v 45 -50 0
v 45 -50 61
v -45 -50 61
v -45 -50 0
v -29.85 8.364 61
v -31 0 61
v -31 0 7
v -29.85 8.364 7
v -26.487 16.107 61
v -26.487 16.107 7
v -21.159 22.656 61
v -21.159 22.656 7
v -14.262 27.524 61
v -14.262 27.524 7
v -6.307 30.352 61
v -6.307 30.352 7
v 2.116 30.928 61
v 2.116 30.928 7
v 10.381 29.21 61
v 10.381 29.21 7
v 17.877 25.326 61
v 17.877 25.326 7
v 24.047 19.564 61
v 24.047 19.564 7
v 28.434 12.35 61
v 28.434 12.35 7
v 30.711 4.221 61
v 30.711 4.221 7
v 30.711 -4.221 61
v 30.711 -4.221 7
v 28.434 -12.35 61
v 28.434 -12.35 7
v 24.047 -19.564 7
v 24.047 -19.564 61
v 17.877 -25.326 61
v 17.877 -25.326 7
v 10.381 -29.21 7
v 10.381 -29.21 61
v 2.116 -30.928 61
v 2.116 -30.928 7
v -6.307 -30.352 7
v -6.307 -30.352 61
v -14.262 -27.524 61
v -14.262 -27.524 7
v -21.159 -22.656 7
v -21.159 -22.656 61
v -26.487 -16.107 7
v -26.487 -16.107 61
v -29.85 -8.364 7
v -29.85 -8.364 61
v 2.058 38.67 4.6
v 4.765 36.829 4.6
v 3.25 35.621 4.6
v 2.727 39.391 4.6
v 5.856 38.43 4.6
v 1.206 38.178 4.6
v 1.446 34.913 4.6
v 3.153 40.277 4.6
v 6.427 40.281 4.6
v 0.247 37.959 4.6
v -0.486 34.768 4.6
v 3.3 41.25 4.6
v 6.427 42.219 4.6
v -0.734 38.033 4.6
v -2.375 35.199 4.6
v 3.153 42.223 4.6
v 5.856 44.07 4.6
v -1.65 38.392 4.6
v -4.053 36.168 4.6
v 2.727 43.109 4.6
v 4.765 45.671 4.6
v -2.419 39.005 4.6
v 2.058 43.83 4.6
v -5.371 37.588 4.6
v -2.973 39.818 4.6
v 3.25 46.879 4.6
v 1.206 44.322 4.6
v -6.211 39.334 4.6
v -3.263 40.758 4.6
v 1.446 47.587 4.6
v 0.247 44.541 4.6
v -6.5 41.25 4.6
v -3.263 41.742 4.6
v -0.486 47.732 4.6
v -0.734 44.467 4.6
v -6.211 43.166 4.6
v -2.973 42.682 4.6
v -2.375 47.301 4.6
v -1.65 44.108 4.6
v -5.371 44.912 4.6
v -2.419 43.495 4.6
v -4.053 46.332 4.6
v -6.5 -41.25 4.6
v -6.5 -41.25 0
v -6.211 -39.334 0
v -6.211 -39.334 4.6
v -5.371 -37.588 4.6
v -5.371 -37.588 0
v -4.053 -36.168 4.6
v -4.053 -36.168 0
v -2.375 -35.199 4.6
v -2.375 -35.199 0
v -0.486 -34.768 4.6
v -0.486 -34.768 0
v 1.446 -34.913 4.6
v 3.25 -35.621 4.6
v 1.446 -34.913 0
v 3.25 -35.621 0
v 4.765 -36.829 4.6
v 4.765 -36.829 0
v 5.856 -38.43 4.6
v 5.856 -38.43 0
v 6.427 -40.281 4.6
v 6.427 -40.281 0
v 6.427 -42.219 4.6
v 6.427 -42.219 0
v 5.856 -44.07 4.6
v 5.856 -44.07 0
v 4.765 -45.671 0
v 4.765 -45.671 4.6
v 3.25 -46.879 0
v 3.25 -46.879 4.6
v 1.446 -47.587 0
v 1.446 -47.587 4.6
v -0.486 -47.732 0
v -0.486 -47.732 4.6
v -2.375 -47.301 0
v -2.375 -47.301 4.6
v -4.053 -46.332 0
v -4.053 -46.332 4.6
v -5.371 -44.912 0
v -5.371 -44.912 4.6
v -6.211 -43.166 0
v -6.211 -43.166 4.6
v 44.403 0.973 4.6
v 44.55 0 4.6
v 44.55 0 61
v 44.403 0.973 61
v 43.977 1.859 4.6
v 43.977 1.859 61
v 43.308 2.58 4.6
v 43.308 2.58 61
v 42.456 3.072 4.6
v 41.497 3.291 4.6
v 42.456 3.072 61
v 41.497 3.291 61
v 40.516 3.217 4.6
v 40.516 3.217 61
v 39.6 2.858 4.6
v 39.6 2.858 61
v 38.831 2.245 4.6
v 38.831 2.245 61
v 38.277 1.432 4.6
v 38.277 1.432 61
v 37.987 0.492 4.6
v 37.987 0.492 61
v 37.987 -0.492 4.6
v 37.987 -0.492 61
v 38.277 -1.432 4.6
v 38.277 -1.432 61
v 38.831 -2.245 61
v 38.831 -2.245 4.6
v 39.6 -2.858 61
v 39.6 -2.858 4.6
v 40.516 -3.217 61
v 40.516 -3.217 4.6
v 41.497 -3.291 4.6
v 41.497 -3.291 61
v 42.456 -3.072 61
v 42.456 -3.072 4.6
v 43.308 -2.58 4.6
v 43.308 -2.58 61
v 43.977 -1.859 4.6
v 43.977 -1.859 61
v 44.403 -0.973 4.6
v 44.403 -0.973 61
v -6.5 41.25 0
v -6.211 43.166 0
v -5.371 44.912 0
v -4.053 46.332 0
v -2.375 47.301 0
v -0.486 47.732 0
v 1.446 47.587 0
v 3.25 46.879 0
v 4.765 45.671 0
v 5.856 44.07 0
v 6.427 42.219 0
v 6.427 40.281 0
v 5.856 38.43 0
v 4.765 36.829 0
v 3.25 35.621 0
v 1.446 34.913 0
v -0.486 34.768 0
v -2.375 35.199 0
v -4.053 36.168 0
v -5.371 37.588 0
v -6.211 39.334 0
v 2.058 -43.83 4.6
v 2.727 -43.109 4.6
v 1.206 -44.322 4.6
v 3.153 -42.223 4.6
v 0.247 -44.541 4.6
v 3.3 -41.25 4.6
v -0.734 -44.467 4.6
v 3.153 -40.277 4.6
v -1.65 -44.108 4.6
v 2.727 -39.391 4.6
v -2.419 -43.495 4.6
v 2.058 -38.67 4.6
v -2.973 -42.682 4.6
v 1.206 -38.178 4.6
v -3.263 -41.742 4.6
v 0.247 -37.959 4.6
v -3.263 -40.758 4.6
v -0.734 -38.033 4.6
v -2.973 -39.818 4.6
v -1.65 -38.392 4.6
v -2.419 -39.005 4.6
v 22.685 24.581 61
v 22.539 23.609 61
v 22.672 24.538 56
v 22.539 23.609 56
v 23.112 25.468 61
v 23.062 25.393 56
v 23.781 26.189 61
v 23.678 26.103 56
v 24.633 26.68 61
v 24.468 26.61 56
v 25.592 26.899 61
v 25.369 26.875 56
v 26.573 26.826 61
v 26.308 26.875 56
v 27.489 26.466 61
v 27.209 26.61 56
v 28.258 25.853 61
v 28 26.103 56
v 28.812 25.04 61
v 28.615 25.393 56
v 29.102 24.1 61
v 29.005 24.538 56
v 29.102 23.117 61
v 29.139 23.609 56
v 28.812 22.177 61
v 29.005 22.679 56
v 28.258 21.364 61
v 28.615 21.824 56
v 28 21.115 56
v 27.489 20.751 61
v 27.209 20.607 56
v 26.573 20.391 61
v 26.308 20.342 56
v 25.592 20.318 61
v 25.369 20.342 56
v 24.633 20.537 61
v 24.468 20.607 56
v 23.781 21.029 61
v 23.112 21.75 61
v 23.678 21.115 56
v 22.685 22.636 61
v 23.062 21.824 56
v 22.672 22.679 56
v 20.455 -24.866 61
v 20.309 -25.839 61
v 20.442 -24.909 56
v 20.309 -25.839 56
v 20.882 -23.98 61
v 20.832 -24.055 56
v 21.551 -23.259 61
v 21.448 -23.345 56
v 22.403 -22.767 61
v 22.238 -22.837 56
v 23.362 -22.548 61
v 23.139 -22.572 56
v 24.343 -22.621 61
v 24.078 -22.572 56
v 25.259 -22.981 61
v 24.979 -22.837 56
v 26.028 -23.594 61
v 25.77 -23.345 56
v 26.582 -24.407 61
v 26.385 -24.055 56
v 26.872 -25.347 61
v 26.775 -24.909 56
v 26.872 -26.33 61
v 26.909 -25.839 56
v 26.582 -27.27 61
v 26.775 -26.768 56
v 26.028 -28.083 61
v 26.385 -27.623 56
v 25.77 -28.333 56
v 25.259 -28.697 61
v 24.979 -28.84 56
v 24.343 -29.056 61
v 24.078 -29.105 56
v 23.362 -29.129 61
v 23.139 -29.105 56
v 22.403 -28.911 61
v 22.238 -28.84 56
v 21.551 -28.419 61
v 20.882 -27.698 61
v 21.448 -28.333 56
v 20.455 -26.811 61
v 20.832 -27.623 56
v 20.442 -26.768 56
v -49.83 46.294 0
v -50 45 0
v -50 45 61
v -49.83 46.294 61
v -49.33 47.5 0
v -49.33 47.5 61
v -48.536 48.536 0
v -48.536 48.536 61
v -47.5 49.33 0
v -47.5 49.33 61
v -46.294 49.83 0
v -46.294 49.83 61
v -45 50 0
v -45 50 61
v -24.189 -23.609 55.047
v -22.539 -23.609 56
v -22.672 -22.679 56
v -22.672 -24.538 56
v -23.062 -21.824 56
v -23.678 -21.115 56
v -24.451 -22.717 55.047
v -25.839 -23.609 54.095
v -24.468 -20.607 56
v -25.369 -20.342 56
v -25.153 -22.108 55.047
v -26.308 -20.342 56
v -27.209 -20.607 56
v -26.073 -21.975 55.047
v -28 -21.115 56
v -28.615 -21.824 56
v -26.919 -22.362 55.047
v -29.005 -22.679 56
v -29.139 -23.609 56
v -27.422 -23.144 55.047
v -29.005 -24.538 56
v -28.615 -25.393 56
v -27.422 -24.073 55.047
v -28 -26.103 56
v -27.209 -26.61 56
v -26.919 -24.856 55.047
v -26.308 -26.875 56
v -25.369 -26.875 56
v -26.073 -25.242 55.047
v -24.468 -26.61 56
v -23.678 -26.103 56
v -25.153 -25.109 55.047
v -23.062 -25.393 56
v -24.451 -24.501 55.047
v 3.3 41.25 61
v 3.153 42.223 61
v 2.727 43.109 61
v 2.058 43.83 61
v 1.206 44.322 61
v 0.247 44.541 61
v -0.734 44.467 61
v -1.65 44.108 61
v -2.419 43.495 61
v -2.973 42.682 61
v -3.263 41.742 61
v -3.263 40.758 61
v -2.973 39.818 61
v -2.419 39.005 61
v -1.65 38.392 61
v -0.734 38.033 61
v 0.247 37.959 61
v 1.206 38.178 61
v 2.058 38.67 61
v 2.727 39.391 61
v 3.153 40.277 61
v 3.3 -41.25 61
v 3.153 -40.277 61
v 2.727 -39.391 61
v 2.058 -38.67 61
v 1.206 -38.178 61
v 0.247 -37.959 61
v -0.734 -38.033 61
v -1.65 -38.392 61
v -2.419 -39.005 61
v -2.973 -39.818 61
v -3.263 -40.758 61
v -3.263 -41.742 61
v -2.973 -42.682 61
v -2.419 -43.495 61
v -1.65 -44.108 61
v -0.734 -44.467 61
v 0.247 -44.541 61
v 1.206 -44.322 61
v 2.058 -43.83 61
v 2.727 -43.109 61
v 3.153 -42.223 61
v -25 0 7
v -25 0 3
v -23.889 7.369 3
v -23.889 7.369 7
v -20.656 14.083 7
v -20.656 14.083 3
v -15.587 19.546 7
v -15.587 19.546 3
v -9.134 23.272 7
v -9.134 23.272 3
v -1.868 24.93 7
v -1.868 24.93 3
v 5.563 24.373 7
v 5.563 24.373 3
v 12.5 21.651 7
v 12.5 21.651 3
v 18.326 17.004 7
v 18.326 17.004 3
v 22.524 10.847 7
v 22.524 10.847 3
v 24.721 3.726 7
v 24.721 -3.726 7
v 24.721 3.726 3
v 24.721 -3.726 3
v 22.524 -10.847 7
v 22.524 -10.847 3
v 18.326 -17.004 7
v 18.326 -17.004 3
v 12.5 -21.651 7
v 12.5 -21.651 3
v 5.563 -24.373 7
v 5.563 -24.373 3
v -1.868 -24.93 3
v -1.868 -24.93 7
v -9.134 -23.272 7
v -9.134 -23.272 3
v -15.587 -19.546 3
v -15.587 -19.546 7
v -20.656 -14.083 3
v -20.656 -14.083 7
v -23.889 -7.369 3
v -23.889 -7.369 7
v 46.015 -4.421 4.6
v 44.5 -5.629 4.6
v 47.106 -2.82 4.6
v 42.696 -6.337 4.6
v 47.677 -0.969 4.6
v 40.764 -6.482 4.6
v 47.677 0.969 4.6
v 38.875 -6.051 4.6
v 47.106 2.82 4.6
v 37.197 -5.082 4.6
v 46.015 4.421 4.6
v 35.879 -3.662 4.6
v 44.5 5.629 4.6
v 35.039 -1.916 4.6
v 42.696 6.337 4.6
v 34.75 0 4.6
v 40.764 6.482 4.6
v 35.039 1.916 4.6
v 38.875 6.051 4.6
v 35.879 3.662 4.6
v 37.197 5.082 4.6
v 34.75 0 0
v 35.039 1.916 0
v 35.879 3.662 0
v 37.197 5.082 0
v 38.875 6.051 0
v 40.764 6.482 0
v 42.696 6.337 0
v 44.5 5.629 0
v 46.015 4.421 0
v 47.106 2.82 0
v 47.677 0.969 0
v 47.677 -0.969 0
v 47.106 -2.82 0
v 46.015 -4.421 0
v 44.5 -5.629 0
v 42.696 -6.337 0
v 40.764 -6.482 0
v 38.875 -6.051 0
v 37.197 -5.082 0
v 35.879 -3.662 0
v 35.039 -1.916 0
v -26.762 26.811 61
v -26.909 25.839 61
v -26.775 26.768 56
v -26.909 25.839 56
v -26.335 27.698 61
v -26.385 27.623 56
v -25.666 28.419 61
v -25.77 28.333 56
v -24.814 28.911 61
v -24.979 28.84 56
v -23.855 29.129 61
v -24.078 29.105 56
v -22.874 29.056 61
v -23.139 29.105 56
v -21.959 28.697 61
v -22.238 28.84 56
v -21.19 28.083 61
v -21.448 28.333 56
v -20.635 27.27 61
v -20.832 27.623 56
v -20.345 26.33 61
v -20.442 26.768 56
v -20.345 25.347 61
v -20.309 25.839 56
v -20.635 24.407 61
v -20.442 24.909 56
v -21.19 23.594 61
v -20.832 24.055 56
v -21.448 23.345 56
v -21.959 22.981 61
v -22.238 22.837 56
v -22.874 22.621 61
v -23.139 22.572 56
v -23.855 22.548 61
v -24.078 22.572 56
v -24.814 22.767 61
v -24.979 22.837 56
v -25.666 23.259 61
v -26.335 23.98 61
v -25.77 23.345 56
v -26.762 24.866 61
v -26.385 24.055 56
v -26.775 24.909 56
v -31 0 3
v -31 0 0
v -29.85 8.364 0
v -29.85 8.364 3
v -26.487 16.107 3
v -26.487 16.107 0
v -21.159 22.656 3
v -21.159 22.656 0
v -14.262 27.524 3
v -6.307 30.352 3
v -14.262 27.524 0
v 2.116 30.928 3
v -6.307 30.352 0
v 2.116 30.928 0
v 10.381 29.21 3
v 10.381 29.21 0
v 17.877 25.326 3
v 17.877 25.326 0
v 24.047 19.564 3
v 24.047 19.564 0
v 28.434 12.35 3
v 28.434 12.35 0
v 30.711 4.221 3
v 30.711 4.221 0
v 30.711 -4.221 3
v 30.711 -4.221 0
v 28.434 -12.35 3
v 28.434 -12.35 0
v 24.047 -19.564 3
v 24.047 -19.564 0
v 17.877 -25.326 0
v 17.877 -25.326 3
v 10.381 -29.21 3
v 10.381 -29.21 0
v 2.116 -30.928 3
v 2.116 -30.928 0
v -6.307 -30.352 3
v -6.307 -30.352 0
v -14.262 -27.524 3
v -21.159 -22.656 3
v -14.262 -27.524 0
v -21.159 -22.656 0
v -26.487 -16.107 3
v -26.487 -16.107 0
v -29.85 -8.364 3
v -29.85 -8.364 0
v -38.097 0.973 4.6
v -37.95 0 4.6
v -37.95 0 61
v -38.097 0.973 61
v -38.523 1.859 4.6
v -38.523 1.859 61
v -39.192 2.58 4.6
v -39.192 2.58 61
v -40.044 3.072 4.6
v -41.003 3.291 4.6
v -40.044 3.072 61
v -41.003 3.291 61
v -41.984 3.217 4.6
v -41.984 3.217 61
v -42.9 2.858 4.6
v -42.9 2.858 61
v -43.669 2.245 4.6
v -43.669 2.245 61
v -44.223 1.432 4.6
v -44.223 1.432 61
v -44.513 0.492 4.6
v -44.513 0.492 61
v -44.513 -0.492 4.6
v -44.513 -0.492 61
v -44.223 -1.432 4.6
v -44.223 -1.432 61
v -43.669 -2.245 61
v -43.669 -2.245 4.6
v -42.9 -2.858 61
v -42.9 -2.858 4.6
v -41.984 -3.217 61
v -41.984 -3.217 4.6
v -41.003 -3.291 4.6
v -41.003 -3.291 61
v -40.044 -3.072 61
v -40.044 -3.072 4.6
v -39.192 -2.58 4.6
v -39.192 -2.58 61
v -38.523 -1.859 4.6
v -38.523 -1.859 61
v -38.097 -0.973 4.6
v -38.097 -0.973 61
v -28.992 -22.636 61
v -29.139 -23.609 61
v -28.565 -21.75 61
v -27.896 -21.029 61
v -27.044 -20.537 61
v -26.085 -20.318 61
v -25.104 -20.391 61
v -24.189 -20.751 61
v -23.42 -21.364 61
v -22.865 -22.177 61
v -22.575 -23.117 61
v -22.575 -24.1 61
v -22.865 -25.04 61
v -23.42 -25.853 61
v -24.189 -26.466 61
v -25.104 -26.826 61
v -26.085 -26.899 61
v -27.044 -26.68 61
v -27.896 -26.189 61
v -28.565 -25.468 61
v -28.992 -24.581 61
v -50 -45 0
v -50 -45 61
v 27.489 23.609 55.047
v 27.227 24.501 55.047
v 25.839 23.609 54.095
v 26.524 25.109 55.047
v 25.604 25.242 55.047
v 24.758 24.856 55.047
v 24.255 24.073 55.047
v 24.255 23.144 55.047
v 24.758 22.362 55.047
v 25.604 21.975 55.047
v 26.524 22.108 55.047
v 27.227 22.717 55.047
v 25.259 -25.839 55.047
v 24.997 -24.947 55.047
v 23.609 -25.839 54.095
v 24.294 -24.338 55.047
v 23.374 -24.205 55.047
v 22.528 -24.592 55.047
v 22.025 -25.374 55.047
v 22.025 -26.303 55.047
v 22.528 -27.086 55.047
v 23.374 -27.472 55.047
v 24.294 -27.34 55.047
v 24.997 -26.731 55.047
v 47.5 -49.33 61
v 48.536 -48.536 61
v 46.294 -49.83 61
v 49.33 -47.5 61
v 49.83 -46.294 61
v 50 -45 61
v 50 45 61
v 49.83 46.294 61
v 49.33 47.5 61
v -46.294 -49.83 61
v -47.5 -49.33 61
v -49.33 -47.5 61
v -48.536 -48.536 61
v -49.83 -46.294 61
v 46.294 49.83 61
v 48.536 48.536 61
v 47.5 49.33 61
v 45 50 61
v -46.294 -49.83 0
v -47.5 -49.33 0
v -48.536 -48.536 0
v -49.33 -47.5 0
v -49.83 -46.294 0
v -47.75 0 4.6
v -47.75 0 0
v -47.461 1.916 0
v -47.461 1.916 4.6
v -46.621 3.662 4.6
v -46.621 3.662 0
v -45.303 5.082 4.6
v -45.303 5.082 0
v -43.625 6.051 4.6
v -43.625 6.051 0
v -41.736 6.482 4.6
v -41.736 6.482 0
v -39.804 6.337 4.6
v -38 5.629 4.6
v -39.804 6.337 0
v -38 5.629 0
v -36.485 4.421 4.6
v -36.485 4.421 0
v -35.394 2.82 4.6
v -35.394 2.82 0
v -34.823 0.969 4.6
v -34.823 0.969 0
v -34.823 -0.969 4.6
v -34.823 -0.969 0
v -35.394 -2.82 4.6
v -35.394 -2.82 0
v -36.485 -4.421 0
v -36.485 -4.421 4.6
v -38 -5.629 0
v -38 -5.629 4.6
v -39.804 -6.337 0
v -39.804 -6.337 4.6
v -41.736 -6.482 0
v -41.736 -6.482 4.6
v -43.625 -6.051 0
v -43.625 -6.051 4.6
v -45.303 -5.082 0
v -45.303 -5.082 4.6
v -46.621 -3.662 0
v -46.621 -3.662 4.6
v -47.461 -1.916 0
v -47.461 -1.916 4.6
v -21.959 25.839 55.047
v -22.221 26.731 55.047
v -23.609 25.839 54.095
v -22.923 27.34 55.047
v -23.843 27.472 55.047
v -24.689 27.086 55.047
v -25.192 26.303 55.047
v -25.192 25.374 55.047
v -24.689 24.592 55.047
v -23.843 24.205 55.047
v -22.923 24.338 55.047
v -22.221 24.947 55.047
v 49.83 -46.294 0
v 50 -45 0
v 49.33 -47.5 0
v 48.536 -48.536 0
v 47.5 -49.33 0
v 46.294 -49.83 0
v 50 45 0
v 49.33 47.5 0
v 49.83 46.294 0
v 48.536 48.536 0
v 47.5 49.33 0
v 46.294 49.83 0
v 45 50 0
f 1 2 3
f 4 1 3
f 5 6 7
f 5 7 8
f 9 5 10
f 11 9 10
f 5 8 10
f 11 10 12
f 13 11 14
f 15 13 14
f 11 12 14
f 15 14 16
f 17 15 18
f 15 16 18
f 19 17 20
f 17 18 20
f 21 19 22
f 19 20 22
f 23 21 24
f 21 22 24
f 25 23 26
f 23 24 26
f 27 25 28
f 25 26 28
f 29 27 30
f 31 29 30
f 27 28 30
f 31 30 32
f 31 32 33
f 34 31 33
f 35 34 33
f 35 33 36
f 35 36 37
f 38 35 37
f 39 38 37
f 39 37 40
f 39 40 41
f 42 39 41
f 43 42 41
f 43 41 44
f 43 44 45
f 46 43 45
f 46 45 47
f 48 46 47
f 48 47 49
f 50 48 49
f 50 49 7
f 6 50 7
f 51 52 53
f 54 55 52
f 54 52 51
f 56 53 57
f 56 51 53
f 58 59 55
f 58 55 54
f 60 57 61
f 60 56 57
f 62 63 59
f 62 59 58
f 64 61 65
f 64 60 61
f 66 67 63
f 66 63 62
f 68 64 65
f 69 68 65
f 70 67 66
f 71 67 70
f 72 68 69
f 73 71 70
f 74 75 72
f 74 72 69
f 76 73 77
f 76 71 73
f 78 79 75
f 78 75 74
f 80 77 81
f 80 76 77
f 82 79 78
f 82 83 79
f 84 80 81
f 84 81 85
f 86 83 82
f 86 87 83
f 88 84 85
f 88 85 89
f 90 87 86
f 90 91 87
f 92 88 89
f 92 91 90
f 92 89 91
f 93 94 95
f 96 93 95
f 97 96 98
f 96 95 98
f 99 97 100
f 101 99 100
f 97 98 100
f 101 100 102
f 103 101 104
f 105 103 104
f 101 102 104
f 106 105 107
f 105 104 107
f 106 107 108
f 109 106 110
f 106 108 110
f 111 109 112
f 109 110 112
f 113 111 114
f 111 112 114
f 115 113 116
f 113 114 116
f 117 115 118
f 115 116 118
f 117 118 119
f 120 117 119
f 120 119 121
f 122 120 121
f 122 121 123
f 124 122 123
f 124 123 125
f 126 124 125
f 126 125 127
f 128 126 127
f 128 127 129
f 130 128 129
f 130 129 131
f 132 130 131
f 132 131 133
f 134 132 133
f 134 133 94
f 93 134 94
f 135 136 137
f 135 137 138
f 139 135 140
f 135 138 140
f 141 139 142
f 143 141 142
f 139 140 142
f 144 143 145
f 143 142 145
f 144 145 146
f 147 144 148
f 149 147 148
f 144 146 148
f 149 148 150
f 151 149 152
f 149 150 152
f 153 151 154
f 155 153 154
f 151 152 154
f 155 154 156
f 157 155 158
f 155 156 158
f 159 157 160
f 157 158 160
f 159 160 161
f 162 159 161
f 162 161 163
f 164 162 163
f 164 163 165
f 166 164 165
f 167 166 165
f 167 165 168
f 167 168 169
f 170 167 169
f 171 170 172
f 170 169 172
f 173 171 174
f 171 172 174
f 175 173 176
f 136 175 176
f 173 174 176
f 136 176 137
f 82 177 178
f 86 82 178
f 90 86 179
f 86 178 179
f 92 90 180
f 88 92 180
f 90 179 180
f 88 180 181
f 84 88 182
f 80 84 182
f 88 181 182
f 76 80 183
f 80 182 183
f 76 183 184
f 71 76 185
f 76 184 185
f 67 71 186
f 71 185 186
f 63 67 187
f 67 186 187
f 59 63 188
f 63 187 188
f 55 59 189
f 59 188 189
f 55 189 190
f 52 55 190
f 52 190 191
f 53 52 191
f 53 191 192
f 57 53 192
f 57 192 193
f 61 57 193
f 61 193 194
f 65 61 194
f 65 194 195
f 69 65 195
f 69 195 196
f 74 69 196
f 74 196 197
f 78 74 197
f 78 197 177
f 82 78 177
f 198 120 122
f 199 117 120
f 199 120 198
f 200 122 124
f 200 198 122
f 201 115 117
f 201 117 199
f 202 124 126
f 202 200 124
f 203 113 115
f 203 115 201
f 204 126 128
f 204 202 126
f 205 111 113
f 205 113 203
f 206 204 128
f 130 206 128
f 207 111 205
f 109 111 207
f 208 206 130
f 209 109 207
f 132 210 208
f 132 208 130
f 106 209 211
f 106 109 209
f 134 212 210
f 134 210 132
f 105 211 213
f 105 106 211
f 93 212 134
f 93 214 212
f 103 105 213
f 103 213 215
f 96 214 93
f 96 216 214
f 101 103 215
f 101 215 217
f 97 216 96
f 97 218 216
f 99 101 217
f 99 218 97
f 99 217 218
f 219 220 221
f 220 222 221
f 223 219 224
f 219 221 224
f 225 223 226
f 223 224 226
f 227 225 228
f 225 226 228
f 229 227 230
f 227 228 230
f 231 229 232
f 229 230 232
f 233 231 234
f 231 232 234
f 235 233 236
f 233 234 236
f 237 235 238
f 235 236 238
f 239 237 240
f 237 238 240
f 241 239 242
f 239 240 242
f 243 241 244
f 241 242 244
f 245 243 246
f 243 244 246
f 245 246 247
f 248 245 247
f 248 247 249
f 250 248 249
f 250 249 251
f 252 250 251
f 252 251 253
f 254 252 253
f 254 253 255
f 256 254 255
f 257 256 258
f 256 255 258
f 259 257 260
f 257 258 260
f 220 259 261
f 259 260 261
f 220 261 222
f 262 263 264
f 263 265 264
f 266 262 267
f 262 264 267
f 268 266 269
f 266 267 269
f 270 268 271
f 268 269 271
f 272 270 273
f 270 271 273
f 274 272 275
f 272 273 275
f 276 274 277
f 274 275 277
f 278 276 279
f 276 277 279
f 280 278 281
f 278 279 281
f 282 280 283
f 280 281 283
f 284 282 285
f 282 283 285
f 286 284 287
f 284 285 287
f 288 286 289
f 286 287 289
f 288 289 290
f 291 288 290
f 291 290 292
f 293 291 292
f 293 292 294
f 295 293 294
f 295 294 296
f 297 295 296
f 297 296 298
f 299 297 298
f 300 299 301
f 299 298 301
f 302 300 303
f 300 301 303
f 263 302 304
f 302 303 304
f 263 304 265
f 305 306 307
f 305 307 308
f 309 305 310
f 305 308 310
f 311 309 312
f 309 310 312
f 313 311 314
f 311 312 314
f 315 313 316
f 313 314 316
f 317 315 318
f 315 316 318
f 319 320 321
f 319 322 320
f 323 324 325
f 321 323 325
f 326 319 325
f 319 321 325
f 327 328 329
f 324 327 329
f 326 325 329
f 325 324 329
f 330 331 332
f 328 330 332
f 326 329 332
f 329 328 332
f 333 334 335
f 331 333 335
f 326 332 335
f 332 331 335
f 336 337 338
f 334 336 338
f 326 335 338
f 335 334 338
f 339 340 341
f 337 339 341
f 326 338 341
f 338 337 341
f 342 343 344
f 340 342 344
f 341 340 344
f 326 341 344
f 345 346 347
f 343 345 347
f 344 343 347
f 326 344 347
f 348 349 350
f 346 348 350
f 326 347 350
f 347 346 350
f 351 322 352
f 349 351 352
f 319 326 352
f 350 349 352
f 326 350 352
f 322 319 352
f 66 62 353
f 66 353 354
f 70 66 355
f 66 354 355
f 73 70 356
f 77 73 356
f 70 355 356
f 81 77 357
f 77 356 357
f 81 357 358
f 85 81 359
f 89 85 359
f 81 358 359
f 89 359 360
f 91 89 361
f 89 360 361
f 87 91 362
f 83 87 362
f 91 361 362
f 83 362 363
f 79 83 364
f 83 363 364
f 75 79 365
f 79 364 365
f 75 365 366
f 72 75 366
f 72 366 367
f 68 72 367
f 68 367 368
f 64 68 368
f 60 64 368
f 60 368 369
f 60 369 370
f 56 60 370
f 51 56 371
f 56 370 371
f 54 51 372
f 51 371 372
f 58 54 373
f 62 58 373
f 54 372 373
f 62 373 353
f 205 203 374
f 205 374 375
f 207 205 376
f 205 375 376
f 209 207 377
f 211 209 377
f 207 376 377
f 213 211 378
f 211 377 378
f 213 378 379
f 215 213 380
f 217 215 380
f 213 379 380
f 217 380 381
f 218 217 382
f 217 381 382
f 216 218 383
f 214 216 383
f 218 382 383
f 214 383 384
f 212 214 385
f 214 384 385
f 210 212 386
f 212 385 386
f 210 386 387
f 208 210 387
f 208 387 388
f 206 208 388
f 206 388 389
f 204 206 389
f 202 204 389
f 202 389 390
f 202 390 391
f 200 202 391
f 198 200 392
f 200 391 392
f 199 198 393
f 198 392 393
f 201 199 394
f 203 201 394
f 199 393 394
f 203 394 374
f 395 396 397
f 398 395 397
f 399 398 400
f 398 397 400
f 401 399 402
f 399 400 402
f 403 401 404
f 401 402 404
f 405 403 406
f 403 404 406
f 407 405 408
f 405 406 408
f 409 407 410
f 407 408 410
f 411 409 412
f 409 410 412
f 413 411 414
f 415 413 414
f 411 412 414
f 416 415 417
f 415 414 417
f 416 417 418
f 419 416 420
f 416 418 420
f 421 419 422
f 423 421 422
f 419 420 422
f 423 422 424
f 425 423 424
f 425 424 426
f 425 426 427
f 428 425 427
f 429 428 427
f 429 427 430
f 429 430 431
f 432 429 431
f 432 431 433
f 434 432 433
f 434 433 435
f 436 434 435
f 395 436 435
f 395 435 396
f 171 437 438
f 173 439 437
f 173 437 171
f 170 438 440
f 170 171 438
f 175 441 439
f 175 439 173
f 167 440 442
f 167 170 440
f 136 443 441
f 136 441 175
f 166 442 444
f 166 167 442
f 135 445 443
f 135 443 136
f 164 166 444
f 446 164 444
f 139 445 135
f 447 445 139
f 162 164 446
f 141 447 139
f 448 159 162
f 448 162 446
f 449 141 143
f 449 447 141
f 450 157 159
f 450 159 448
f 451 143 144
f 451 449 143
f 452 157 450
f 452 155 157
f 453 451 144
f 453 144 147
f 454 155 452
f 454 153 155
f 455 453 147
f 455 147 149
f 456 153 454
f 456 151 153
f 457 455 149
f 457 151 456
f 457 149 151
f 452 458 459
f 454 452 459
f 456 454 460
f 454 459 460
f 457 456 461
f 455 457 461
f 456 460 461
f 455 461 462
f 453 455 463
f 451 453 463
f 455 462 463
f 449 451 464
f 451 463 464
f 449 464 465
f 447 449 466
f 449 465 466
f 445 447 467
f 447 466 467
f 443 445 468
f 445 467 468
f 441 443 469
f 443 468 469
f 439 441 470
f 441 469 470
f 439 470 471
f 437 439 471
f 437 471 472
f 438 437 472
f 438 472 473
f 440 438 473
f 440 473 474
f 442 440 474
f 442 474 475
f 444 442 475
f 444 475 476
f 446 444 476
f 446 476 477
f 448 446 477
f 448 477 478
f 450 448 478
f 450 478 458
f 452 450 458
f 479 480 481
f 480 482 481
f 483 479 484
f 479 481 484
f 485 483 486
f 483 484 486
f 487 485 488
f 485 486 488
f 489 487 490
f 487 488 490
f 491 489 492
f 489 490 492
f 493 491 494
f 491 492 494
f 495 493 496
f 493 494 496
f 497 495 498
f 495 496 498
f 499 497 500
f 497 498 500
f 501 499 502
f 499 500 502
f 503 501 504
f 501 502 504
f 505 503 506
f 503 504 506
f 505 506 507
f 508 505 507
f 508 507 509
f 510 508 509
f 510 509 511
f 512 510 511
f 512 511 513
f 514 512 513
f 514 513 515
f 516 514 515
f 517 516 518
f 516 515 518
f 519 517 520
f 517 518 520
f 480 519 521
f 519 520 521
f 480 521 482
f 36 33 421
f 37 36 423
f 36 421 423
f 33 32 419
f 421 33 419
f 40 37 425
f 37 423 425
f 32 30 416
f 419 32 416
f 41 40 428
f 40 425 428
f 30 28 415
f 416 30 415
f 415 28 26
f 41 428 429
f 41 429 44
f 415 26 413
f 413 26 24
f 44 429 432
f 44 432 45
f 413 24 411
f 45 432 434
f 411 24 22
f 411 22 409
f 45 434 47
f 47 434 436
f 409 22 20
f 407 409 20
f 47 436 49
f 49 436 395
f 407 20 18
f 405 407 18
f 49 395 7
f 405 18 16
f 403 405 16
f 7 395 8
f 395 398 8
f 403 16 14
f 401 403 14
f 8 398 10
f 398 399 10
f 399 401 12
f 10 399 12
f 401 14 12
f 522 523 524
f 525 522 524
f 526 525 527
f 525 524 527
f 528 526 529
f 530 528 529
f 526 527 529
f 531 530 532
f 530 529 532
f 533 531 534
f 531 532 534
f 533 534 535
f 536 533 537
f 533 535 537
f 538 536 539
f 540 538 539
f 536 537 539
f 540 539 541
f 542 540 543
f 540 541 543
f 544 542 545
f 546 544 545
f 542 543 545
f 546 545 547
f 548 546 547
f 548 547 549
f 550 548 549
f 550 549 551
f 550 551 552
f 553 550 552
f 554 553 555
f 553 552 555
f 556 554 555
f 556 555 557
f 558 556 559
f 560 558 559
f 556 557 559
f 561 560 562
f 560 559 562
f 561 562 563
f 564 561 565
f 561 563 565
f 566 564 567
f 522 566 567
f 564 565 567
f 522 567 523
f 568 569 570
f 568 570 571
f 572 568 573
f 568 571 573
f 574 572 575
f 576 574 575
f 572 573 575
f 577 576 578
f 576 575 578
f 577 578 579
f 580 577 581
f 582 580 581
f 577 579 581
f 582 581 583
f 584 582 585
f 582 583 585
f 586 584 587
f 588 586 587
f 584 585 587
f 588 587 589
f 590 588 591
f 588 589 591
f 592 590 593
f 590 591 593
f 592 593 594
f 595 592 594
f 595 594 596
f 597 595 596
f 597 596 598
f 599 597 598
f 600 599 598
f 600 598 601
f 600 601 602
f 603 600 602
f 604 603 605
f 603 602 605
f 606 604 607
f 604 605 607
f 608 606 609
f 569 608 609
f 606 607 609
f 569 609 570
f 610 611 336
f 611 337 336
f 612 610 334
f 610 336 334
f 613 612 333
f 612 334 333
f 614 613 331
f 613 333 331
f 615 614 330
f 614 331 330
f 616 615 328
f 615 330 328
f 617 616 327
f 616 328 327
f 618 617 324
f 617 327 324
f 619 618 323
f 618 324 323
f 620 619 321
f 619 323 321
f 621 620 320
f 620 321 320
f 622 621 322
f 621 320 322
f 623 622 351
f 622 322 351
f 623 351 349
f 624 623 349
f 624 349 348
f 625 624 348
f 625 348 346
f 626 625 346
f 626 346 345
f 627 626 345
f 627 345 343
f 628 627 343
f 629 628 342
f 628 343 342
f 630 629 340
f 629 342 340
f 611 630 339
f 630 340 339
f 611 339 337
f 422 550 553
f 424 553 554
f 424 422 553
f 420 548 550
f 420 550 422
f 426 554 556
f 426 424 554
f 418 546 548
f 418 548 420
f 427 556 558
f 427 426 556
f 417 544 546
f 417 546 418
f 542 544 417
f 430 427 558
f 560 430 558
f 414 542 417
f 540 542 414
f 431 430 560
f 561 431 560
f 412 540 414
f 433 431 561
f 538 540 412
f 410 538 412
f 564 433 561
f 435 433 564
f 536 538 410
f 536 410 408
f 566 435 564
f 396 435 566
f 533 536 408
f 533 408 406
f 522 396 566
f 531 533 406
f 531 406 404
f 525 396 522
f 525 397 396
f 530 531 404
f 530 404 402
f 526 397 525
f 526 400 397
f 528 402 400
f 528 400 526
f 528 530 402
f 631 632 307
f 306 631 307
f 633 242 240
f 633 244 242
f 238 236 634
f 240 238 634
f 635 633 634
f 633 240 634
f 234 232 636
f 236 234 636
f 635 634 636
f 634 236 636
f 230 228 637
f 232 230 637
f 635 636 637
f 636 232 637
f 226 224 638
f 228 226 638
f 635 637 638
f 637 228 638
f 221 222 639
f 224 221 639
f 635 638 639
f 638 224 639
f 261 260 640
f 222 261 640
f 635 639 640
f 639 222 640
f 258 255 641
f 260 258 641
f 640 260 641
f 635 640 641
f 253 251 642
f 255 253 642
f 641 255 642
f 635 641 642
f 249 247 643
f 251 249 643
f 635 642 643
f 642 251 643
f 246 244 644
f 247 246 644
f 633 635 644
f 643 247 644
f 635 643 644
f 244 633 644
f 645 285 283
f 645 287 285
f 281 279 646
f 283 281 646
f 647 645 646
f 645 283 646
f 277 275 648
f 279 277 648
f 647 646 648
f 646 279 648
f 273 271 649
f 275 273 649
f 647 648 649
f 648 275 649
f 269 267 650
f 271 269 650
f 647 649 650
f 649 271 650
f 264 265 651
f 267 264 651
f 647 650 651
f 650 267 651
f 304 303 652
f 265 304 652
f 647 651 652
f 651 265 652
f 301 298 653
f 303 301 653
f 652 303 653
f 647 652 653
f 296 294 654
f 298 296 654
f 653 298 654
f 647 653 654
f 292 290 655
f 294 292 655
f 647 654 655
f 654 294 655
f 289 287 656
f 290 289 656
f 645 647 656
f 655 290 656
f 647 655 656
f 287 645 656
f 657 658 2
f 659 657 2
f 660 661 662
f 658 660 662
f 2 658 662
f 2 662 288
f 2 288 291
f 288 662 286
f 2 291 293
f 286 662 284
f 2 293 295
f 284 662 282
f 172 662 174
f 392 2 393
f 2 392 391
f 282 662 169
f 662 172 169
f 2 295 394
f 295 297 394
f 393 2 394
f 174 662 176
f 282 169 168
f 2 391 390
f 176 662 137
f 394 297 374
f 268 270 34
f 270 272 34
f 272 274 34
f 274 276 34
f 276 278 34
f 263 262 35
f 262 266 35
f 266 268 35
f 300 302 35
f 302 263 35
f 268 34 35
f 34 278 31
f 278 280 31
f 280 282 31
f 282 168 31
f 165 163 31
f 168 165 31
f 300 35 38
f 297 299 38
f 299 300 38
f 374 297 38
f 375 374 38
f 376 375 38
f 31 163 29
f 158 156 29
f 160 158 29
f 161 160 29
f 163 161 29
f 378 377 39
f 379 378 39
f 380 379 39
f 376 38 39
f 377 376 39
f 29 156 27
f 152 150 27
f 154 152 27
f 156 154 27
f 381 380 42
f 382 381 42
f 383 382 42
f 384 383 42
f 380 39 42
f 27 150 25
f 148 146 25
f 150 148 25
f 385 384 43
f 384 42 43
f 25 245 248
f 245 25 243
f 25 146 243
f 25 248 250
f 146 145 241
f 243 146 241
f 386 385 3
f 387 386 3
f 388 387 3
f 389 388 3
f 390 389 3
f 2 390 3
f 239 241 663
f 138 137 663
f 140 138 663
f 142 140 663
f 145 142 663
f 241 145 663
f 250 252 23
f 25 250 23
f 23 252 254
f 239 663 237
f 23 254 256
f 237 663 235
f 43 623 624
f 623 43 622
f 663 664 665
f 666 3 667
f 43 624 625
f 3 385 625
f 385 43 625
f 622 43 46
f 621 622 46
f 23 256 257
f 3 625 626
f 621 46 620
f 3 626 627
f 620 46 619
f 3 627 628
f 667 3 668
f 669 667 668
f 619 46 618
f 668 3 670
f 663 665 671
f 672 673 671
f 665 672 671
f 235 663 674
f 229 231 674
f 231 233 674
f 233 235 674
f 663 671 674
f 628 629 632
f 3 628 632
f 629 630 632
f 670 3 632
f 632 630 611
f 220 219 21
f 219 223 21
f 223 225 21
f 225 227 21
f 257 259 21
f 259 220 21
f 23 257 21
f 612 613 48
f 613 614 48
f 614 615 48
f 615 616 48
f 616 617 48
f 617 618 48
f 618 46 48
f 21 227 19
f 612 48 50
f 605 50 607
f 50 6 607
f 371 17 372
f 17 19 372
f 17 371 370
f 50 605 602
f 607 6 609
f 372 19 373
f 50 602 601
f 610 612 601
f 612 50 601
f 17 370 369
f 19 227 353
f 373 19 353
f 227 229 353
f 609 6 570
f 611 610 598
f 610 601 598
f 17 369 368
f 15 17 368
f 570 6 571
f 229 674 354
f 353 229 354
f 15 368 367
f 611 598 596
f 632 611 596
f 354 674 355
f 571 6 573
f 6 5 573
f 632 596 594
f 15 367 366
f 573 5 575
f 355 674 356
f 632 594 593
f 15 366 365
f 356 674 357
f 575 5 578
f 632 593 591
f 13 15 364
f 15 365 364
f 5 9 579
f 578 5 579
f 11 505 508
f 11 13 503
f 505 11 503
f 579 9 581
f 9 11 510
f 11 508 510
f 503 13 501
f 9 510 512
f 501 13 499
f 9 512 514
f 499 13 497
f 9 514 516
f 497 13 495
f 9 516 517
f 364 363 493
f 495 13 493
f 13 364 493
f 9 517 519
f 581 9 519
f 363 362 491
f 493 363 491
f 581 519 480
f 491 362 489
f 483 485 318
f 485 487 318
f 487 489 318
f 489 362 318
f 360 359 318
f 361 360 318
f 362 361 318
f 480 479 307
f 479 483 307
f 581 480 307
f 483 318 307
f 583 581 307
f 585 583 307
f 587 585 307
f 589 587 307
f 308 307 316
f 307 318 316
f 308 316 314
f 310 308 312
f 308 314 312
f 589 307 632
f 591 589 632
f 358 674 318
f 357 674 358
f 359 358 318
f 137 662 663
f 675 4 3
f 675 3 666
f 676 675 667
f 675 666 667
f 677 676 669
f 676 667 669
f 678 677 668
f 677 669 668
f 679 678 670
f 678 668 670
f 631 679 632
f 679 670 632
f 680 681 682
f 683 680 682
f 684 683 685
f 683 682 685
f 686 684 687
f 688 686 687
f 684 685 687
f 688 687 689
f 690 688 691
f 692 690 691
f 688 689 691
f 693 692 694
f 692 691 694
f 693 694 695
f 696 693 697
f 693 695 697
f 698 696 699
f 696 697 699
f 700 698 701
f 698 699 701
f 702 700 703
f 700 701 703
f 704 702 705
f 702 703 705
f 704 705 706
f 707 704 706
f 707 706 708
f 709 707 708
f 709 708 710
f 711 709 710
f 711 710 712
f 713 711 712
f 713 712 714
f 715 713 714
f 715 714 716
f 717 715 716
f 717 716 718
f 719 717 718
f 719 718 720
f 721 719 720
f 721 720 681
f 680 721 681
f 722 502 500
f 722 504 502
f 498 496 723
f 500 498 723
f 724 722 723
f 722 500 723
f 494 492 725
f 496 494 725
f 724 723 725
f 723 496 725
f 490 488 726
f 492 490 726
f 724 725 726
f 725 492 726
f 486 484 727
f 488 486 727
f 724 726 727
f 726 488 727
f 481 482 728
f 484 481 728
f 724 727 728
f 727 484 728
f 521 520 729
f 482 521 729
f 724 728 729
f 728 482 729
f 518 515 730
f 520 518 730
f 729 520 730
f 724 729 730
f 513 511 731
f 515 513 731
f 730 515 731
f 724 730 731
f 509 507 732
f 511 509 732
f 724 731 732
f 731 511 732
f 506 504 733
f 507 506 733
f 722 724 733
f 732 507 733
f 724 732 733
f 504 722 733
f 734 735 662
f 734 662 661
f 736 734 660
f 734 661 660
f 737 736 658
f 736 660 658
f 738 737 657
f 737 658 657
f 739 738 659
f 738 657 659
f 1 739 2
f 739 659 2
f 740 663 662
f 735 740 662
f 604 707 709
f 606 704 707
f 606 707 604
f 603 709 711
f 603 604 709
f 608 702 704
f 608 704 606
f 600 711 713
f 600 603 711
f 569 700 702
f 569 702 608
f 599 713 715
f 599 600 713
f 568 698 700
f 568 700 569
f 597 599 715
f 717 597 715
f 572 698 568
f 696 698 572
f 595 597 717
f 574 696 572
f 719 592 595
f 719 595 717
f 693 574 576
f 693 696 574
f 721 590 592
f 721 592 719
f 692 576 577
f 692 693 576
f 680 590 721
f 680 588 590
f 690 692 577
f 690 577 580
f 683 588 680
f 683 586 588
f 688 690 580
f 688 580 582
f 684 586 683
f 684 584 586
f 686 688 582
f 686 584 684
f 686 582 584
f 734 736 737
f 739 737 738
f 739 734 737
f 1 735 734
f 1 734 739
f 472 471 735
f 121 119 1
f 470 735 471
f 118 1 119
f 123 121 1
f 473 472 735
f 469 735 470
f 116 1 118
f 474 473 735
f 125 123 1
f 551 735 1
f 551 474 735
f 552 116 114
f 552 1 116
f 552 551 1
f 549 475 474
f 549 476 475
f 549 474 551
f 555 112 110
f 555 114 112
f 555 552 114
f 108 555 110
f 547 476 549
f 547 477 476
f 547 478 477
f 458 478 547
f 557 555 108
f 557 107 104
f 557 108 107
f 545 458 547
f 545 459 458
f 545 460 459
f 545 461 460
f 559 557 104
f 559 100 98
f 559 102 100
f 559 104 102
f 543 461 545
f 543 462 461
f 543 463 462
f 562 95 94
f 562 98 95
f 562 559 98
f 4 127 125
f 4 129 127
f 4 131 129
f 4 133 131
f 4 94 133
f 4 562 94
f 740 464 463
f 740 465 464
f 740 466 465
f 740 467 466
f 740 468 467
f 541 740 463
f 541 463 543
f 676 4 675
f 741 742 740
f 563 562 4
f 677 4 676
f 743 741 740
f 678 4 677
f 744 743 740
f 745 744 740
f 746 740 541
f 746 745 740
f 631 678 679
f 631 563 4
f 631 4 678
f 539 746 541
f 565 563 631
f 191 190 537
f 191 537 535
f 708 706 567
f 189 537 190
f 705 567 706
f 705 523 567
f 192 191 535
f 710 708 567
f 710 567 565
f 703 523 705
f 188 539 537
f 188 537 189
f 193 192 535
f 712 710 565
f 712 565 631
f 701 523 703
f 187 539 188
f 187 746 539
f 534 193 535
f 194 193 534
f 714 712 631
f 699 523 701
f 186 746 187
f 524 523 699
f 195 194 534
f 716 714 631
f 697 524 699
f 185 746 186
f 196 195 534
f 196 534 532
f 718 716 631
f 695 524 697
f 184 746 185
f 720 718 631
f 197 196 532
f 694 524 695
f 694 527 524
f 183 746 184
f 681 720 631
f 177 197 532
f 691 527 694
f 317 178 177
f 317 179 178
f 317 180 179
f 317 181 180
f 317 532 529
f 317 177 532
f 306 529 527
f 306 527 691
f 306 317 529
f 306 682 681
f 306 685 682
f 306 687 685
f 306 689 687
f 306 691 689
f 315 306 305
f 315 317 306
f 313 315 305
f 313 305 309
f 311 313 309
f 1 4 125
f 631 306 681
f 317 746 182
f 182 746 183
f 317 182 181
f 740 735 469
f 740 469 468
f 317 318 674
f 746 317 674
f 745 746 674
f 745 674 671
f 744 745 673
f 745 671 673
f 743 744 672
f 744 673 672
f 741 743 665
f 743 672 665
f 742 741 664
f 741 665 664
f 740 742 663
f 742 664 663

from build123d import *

# Parameters (mm, degrees)
ESQUISSE1_R                                        = 50
BOSS_EXTRU_1_DEPTH                                 = 61
ESQUISSE2_R                                        = 31
ENL_V_MAT_EXTRU_1_DEPTH                            = 72
CHAMBRAGE_POUR_VIS_T_TE_RONDE_BOMB_E_M_D           = 6.6
CHAMBRAGE_POUR_VIS_T_TE_RONDE_BOMB_E_M_CBORE_D     = 13
CHAMBRAGE_POUR_VIS_T_TE_RONDE_BOMB_E_M_CBORE_DEPTH = 4.6
D_GAGEMENT_M61_D                                   = 6.6
D_GAGEMENT_M61_DEPTH                               = 5
D_GAGEMENT_M61_TIP                                 = 1.905255888
BOSS_EXTRU_2_START                                 = -61
BOSS_EXTRU_2_DEPTH                                 = 61
ESQUISSE23_R                                       = 31
ESQUISSE23_R_2                                     = 25
BOSS_EXTRU_3_DEPTH                                 = 7
ESQUISSE24_R                                       = 31
ENL_V_MAT_EXTRU_2_DEPTH                            = 3


with BuildPart() as part:
    # Esquisse1 → Boss.-Extru.1 (new body)
    with BuildSketch(Plane.XY):
        with Locations(Location((0, 0, 0), (0, 0, 180))):
            Circle(ESQUISSE1_R)
    extrude(amount=BOSS_EXTRU_1_DEPTH)

    # Esquisse2 → Enlèv. mat.-Extru.1 (cut)
    with BuildSketch(Plane(origin=(0, 0, 0), x_dir=(-1, 0, 0), z_dir=(0, 0, -1))):
        Circle(ESQUISSE2_R)
    extrude(amount=-ENL_V_MAT_EXTRU_1_DEPTH, mode=Mode.SUBTRACT)

    # Chambrage pour vis à tête ronde bombée M61 (through all)
    with Locations(Plane(origin=(0, 0, 0), x_dir=(-1, 0, 0), z_dir=(0, 0, -1))):
        with Locations((41.25, 0), (0, 41.25), (-41.25, 0), (0, -41.25)):
            CounterBoreHole(CHAMBRAGE_POUR_VIS_T_TE_RONDE_BOMB_E_M_D / 2, CHAMBRAGE_POUR_VIS_T_TE_RONDE_BOMB_E_M_CBORE_D / 2, CHAMBRAGE_POUR_VIS_T_TE_RONDE_BOMB_E_M_CBORE_DEPTH)

    # Dégagement M61
    with Locations(Plane.XY.offset(61)):
        with Locations((-23.608593004, 25.838621023), (-25.838621023, -23.608593004), (23.608593004, -25.838621023), (25.838621023, 23.608593004)):
            Hole(D_GAGEMENT_M61_D / 2, depth=D_GAGEMENT_M61_DEPTH)
            with Locations((0, 0, -(D_GAGEMENT_M61_DEPTH + D_GAGEMENT_M61_TIP / 2))):  # 120° drill point
                Cone(0, D_GAGEMENT_M61_D / 2, D_GAGEMENT_M61_TIP, mode=Mode.SUBTRACT)

    # Esquisse20 → Boss.-Extru.2 (add)
    with BuildSketch(Plane(origin=(0, 0, 0), x_dir=(-1, 0, 0), z_dir=(0, 0, -1)).offset(BOSS_EXTRU_2_START)):
        with BuildLine():
            ThreePointArc((-50, -45), (-48.535533906, -48.535533906), (-45, -50))
            Line((-45, -50), (0, -50))
            ThreePointArc((0, -50), (-35.35533911, -35.355339009), (-50, 1.43e-07))
            Line((-50, 1.43e-07), (-50, -45))
        make_face()
        with BuildLine():
            ThreePointArc((50, 0), (35.355339059, -35.355339059), (0, -50))
            Line((0, -50), (45, -50))
            ThreePointArc((45, -50), (48.535533906, -48.535533906), (50, -45))
            Line((50, -45), (50, 0))
        make_face()
        with BuildLine():
            Line((-50, 45), (-50, 1.43e-07))
            ThreePointArc((-50, 1.43e-07), (-35.355339046, 35.355339073), (-1.05e-07, 50))
            Line((-1.05e-07, 50), (-45, 50))
            ThreePointArc((-45, 50), (-48.535533906, 48.535533906), (-50, 45))
        make_face()
        with BuildLine():
            ThreePointArc((-1.05e-07, 50), (35.355339022, 35.355339097), (50, 0))
            Line((50, 0), (50, 45))
            ThreePointArc((50, 45), (48.535533906, 48.535533906), (45, 50))
            Line((45, 50), (-1.05e-07, 50))
        make_face()
    extrude(amount=BOSS_EXTRU_2_DEPTH)

    # Esquisse23 → Boss.-Extru.3 (add)
    with BuildSketch(Plane(origin=(0, 0, 0), x_dir=(-1, 0, 0), z_dir=(0, 0, -1))):
        Circle(ESQUISSE23_R)
        Circle(ESQUISSE23_R_2, mode=Mode.SUBTRACT)
    extrude(amount=-BOSS_EXTRU_3_DEPTH)

    # Esquisse24 → Enlèv. mat.-Extru.2 (cut)
    with BuildSketch(Plane(origin=(0, 0, 0), x_dir=(-1, 0, 0), z_dir=(0, 0, -1))):
        Circle(ESQUISSE24_R)
    extrude(amount=-ENL_V_MAT_EXTRU_2_DEPTH, mode=Mode.SUBTRACT)


solid = part.part
